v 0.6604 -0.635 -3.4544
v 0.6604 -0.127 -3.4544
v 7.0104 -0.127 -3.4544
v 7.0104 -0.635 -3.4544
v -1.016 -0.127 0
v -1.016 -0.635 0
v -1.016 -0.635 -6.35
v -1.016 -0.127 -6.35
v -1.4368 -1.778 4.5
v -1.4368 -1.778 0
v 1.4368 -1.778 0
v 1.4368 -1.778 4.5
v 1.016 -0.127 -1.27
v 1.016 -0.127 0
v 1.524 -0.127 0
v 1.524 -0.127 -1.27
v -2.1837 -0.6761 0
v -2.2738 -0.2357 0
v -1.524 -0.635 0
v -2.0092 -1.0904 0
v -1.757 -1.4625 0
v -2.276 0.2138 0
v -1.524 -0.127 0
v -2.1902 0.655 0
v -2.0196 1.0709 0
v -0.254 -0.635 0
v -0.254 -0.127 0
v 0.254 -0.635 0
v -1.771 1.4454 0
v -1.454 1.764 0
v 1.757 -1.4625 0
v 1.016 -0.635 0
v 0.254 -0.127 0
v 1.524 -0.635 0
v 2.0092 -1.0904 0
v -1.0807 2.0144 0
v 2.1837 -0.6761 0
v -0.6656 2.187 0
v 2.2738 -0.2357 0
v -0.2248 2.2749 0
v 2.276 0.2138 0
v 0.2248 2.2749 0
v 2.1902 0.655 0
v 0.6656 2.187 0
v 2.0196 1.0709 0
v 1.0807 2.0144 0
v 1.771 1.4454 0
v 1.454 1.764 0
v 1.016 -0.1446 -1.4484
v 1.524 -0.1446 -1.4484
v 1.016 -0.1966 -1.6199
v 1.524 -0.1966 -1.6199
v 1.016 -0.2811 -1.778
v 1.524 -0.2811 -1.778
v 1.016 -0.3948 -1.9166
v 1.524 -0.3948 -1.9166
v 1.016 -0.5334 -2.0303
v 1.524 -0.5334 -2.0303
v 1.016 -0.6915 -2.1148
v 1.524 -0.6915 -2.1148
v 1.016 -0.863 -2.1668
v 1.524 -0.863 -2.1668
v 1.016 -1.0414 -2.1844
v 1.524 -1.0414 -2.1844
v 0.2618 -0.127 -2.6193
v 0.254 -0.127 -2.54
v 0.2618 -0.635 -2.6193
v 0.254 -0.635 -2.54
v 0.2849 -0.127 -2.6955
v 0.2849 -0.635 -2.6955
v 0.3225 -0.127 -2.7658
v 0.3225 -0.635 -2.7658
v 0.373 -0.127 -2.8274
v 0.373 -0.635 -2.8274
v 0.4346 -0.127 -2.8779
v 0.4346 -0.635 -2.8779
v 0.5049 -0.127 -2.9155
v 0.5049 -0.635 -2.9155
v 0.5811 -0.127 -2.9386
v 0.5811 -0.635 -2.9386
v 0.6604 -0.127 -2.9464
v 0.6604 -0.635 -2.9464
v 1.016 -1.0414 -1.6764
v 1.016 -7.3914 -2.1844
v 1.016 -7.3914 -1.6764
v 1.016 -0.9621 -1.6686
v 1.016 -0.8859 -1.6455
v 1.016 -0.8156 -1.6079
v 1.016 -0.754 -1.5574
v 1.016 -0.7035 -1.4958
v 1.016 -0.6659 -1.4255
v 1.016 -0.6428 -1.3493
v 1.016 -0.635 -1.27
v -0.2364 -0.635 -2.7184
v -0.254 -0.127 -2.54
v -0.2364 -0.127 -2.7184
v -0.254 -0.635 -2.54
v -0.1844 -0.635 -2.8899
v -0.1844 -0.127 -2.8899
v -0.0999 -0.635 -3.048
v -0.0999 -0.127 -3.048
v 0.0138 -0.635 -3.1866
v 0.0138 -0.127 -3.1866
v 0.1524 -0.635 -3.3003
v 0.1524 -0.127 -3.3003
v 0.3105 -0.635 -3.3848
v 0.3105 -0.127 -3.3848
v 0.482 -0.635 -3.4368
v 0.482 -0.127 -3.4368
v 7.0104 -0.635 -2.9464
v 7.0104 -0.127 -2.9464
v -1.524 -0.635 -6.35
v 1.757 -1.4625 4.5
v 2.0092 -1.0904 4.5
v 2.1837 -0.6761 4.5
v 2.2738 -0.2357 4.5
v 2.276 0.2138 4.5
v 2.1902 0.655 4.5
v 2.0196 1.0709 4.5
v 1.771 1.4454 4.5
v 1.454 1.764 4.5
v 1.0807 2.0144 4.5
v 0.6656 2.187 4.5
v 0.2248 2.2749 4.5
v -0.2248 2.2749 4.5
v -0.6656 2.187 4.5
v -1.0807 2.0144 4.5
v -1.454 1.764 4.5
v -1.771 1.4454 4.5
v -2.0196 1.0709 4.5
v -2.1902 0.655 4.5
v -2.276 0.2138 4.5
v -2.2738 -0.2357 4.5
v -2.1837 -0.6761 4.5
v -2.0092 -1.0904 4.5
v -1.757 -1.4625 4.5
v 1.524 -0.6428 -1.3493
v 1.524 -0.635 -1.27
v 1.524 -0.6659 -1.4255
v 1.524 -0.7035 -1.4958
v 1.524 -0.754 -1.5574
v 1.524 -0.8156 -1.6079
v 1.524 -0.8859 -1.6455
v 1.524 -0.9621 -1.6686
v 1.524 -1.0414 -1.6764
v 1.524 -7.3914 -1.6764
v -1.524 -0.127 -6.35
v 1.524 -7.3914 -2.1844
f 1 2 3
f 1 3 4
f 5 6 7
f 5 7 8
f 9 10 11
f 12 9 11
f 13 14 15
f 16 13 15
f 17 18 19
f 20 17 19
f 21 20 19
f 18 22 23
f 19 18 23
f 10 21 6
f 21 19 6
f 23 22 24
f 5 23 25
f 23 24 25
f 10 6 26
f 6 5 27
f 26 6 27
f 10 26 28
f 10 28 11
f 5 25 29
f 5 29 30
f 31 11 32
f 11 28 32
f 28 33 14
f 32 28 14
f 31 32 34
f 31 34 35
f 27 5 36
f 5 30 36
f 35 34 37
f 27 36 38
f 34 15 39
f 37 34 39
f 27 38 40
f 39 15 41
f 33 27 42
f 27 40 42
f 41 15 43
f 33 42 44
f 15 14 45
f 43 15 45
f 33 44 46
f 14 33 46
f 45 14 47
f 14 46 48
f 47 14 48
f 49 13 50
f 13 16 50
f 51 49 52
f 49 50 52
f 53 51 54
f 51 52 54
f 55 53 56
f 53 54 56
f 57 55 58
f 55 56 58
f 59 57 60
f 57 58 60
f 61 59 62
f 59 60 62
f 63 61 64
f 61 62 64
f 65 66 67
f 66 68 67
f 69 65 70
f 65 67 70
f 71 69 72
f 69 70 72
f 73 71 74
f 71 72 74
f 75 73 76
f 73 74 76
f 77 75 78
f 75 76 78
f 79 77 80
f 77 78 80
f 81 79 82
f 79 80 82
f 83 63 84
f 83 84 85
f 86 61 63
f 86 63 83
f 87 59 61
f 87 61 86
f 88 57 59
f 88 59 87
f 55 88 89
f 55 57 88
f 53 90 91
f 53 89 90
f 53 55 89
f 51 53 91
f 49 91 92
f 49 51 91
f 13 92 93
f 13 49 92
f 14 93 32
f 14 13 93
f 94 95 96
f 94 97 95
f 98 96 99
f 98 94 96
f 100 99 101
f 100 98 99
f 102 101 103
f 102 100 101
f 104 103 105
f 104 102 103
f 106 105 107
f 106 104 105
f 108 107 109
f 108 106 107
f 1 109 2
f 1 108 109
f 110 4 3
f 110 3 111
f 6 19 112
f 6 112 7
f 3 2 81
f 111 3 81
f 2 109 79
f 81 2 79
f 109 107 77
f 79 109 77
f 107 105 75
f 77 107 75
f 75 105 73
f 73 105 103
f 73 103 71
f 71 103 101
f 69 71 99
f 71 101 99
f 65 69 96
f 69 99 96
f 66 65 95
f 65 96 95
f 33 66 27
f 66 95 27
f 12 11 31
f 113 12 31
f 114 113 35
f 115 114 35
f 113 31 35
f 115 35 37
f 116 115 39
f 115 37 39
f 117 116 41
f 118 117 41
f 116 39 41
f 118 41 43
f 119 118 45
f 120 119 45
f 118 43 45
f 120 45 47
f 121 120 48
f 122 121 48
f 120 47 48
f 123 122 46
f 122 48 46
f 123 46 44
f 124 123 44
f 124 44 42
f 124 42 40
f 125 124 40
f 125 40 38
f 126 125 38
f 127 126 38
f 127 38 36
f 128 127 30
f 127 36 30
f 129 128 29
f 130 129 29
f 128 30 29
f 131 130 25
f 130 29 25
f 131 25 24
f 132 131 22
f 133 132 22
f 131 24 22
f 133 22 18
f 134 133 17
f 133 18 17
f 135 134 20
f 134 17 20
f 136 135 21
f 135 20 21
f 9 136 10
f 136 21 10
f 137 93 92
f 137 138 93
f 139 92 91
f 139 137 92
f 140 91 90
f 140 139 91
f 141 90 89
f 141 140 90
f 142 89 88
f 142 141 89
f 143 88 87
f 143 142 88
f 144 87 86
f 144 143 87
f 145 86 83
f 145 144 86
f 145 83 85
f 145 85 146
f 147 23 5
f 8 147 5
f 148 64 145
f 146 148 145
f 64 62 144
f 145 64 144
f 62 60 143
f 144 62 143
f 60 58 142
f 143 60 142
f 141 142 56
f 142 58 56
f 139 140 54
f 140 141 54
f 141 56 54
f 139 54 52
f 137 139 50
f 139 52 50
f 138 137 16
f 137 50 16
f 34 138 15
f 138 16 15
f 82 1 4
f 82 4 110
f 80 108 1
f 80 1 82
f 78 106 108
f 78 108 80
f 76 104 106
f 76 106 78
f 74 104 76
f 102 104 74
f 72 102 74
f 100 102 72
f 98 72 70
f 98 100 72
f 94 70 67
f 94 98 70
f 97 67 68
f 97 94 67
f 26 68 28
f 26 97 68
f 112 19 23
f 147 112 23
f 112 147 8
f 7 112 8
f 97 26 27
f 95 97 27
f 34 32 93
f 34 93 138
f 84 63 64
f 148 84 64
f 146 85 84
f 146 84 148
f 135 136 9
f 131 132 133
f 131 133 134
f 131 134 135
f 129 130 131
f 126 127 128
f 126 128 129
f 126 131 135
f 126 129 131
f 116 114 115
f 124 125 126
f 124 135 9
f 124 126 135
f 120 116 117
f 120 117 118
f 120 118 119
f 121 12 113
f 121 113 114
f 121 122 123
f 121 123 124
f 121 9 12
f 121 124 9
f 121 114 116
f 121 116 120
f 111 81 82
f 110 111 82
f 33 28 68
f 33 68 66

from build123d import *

# Parameters (mm, degrees)
F0_W       = 0.508
F0_H       = 0.508
F1_DEPTH   = 4.5
F2_DEPTH   = 1.27
F3_DEPTH   = 2.54
F4_DEPTH   = 6.35
F2_FACE1_W = 0.508
F2_FACE1_H = 0.508
F6_ANGLE   = 90
F7_DEPTH   = 6.35
F3_FACE1_W = 0.508
F3_FACE1_H = 0.508
F9_ANGLE   = 90
F10_DEPTH  = 6.35


with BuildPart() as f1:
    # F0 (on Top) → F1 (new body)
    with BuildSketch(Plane.XY):
        with BuildLine():
            Line((0, -1.778), (1.4368409794, -1.778))
            ThreePointArc((1.4368409794, -1.778), (0, 2.286), (-1.4368409794, -1.778))
            Line((-1.4368409794, -1.778), (0, -1.778))
        make_face()
        with Locations((-1.27, -0.381)):
            Rectangle(F0_W, F0_H, mode=Mode.SUBTRACT)
        with Locations((0, -0.381)):
            Rectangle(F0_W, F0_H, mode=Mode.SUBTRACT)
        with Locations((1.27, -0.381)):
            Rectangle(F0_W, F0_H, mode=Mode.SUBTRACT)
        with Locations((-1.27, -0.381)):
            Rectangle(F0_W, F0_H)
        with Locations((0, -0.381)):
            Rectangle(F0_W, F0_H)
        with Locations((1.27, -0.381)):
            Rectangle(F0_W, F0_H)
    extrude(amount=F1_DEPTH)

    # F0 (on Top) → F2 (join)
    with BuildSketch(Plane.XY):
        with Locations((1.27, -0.381)):
            Rectangle(F0_W, F0_H)
    extrude(amount=-F2_DEPTH)

    # F0 (on Top) → F3 (join)
    with BuildSketch(Plane.XY):
        with Locations((0, -0.381)):
            Rectangle(F0_W, F0_H)
    extrude(amount=-F3_DEPTH)

    # F0 (on Top) → F4 (join)
    with BuildSketch(Plane.XY):
        with Locations((-1.27, -0.381)):
            Rectangle(F0_W, F0_H)
    extrude(amount=-F4_DEPTH)

    # F2_face1 (on face) → F6 (revolve)
    with BuildSketch(Plane(origin=(1.27, -0.381, -1.27), x_dir=(1, 0, 0), z_dir=(0, 0, -1))):
        Rectangle(F2_FACE1_W, F2_FACE1_H)
    revolve(axis=Axis((1.524, -1.0414, -1.27), (-1, 0, 0)), revolution_arc=F6_ANGLE)

    # F7 (add): a face of the model
    f7_faces = [f1.faces().sort_by_distance(p)[0] for p in [
        (1.27, -1.0414, -1.9304),
    ]]
    extrude(f7_faces, amount=F7_DEPTH)

    # F3_face1 (on face) → F9 (revolve)
    with BuildSketch(Plane(origin=(0, -0.381, -2.54), x_dir=(1, 0, 0), z_dir=(0, 0, -1))):
        Rectangle(F3_FACE1_W, F3_FACE1_H)
    revolve(axis=Axis((0.6604, -0.635, -2.54), (0, -1, 0)), revolution_arc=F9_ANGLE)

    # F10 (add): a face of the model
    f10_faces = [f1.faces().sort_by_distance(p)[0] for p in [
        (0.6604, -0.381, -3.2004),
    ]]
    extrude(f10_faces, amount=F10_DEPTH)


solid = f1.part
